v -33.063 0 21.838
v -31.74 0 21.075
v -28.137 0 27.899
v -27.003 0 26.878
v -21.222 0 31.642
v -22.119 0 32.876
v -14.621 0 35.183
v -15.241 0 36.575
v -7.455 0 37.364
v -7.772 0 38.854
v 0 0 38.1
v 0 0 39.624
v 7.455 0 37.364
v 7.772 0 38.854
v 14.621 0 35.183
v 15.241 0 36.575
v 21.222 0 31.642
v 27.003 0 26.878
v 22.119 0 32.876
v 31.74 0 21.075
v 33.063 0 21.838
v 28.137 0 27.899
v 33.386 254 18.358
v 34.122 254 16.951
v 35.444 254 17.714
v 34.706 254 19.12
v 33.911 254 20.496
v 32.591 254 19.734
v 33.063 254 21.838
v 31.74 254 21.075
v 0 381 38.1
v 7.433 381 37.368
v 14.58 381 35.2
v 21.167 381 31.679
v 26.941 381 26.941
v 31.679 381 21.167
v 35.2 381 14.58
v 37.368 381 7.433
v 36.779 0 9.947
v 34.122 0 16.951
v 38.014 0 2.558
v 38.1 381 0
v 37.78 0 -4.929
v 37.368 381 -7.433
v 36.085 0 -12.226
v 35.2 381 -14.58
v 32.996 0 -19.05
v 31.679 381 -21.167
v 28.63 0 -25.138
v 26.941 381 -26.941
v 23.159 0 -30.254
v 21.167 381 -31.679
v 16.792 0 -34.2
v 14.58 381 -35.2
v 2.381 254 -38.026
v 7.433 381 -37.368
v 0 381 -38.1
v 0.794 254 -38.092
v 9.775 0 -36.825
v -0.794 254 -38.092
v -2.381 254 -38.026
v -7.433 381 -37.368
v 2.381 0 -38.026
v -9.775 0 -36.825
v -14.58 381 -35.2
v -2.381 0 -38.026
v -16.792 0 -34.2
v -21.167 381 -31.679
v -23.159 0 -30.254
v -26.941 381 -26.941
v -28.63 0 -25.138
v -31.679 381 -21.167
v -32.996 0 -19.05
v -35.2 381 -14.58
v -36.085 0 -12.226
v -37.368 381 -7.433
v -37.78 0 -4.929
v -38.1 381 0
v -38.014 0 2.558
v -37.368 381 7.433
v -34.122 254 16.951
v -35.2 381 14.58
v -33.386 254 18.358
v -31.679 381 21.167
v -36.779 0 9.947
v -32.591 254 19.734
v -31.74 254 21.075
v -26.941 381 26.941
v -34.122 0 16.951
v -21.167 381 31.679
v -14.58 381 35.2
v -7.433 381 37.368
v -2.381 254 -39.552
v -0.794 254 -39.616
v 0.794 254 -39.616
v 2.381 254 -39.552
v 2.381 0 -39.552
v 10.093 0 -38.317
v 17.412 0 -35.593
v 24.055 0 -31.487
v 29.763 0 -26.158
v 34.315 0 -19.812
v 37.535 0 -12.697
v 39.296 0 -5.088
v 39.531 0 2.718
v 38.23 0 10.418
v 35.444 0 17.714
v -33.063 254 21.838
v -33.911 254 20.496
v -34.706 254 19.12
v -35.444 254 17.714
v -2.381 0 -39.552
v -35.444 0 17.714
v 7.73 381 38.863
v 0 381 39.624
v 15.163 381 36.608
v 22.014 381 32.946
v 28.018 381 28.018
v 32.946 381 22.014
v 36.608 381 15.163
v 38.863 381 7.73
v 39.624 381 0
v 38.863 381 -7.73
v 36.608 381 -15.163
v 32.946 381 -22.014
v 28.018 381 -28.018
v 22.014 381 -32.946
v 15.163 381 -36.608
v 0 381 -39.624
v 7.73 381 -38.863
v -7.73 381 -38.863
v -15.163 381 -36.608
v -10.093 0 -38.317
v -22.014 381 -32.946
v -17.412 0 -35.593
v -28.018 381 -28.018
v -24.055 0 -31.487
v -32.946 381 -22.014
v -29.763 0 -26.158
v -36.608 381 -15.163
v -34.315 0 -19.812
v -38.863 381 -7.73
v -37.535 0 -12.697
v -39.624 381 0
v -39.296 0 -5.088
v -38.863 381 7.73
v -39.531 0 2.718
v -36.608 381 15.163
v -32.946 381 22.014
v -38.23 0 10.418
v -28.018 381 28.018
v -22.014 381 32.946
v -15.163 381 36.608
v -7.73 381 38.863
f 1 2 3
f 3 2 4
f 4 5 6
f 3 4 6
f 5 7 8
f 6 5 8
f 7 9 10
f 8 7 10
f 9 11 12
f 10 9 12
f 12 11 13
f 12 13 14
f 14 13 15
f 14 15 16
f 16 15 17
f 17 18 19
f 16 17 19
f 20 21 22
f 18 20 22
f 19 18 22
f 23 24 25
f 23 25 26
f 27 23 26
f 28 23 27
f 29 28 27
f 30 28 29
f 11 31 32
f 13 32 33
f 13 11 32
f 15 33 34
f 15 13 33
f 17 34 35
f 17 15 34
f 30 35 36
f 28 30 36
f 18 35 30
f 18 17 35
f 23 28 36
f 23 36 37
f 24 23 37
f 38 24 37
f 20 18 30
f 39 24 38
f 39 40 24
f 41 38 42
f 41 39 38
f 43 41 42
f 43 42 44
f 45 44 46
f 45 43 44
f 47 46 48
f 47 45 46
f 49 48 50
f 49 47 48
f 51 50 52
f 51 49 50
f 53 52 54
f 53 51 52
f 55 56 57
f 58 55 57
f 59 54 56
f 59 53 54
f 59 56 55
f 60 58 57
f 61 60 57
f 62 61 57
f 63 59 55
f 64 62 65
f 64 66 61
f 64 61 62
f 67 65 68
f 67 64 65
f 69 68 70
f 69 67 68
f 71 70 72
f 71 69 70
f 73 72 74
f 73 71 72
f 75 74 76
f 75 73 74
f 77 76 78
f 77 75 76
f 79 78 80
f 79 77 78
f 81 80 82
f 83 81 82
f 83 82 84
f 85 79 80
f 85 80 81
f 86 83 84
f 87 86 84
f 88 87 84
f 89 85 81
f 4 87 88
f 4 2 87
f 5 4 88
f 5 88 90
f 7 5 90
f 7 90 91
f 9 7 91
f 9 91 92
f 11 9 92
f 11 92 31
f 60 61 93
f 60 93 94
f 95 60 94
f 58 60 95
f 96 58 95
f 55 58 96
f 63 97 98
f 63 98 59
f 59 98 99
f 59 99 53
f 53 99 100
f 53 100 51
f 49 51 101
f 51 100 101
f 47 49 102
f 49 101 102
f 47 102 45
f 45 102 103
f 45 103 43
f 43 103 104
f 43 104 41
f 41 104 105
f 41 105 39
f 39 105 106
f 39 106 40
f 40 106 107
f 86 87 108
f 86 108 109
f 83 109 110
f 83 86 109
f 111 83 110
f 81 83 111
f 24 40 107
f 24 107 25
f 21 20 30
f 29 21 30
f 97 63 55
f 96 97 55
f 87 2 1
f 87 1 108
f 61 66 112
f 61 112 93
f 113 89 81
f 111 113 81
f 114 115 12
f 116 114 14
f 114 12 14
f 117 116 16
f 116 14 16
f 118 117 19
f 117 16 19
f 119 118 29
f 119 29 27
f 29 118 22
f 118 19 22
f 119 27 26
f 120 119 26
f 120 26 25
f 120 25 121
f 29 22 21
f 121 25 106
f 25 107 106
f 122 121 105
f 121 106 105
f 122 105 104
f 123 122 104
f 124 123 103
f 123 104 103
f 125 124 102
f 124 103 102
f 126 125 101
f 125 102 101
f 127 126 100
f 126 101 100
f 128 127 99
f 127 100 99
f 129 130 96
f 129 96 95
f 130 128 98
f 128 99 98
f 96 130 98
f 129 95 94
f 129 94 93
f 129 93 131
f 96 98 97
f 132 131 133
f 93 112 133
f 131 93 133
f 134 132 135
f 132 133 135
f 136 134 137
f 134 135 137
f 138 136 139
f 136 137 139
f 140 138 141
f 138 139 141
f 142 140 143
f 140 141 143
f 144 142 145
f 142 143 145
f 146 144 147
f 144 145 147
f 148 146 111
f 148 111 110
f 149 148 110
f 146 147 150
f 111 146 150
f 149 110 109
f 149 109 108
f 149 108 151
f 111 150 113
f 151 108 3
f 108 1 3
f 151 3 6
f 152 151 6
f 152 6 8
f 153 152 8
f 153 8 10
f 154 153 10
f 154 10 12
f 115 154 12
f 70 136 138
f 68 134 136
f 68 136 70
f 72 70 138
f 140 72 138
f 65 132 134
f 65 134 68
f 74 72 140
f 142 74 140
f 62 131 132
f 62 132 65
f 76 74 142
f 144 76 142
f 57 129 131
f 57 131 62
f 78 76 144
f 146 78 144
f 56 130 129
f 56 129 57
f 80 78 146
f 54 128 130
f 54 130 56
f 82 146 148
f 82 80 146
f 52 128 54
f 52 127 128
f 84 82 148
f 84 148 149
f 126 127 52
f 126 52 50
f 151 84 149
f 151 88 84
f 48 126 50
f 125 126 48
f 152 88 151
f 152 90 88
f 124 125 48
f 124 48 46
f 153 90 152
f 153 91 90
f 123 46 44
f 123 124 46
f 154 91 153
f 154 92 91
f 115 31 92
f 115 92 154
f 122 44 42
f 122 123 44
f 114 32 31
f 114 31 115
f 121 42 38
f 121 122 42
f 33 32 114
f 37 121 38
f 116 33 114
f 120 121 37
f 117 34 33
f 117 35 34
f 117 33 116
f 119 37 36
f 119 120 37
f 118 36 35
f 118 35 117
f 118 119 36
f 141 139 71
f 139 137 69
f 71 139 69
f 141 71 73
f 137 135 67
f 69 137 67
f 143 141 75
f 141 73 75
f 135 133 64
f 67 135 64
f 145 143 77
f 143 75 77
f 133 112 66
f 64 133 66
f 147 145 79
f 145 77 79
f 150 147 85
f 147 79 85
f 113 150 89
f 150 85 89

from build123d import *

# Parameters (mm, degrees)
SKETCH1_R           = 39.624
SKETCH1_R_2         = 38.1
BOSS_EXTRUDE1_DEPTH = 381
SKETCH2_W           = 4.7625
SKETCH2_H           = 254
CUT_EXTRUDE1_DEPTH  = 386.098848027
CIRPATTERN1_COUNT   = 3


with BuildPart() as part:
    # Sketch1 → Boss-Extrude1 (new body)
    with BuildSketch(Plane(origin=(0, 0, 0), x_dir=(1, 0, 0), z_dir=(0, 1, 0))):
        with Locations(Location((0, 0, 0), (0, 0, 270))):
            Circle(SKETCH1_R)
        with Locations(Location((0, 0, 0), (0, 0, 270))):
            Circle(SKETCH1_R_2, mode=Mode.SUBTRACT)
    extrude(amount=BOSS_EXTRUDE1_DEPTH)

    # Sketch2 → Cut-Extrude1 (cut, through all)
    with BuildSketch(Plane.XY):
        with Locations((0, 127)):
            Rectangle(SKETCH2_W, SKETCH2_H)
    cut_extrude1 = extrude(amount=-CUT_EXTRUDE1_DEPTH, mode=Mode.SUBTRACT)

    # CirPattern1: Cut-Extrude1 ×3 about axis
    cirpattern1_axis = Axis((0, 0, 0), (0, 1, 0))
    for i in range(1, CIRPATTERN1_COUNT):
        add(cut_extrude1.rotate(cirpattern1_axis, i * 360 / CIRPATTERN1_COUNT), mode=Mode.SUBTRACT)


solid = part.part
